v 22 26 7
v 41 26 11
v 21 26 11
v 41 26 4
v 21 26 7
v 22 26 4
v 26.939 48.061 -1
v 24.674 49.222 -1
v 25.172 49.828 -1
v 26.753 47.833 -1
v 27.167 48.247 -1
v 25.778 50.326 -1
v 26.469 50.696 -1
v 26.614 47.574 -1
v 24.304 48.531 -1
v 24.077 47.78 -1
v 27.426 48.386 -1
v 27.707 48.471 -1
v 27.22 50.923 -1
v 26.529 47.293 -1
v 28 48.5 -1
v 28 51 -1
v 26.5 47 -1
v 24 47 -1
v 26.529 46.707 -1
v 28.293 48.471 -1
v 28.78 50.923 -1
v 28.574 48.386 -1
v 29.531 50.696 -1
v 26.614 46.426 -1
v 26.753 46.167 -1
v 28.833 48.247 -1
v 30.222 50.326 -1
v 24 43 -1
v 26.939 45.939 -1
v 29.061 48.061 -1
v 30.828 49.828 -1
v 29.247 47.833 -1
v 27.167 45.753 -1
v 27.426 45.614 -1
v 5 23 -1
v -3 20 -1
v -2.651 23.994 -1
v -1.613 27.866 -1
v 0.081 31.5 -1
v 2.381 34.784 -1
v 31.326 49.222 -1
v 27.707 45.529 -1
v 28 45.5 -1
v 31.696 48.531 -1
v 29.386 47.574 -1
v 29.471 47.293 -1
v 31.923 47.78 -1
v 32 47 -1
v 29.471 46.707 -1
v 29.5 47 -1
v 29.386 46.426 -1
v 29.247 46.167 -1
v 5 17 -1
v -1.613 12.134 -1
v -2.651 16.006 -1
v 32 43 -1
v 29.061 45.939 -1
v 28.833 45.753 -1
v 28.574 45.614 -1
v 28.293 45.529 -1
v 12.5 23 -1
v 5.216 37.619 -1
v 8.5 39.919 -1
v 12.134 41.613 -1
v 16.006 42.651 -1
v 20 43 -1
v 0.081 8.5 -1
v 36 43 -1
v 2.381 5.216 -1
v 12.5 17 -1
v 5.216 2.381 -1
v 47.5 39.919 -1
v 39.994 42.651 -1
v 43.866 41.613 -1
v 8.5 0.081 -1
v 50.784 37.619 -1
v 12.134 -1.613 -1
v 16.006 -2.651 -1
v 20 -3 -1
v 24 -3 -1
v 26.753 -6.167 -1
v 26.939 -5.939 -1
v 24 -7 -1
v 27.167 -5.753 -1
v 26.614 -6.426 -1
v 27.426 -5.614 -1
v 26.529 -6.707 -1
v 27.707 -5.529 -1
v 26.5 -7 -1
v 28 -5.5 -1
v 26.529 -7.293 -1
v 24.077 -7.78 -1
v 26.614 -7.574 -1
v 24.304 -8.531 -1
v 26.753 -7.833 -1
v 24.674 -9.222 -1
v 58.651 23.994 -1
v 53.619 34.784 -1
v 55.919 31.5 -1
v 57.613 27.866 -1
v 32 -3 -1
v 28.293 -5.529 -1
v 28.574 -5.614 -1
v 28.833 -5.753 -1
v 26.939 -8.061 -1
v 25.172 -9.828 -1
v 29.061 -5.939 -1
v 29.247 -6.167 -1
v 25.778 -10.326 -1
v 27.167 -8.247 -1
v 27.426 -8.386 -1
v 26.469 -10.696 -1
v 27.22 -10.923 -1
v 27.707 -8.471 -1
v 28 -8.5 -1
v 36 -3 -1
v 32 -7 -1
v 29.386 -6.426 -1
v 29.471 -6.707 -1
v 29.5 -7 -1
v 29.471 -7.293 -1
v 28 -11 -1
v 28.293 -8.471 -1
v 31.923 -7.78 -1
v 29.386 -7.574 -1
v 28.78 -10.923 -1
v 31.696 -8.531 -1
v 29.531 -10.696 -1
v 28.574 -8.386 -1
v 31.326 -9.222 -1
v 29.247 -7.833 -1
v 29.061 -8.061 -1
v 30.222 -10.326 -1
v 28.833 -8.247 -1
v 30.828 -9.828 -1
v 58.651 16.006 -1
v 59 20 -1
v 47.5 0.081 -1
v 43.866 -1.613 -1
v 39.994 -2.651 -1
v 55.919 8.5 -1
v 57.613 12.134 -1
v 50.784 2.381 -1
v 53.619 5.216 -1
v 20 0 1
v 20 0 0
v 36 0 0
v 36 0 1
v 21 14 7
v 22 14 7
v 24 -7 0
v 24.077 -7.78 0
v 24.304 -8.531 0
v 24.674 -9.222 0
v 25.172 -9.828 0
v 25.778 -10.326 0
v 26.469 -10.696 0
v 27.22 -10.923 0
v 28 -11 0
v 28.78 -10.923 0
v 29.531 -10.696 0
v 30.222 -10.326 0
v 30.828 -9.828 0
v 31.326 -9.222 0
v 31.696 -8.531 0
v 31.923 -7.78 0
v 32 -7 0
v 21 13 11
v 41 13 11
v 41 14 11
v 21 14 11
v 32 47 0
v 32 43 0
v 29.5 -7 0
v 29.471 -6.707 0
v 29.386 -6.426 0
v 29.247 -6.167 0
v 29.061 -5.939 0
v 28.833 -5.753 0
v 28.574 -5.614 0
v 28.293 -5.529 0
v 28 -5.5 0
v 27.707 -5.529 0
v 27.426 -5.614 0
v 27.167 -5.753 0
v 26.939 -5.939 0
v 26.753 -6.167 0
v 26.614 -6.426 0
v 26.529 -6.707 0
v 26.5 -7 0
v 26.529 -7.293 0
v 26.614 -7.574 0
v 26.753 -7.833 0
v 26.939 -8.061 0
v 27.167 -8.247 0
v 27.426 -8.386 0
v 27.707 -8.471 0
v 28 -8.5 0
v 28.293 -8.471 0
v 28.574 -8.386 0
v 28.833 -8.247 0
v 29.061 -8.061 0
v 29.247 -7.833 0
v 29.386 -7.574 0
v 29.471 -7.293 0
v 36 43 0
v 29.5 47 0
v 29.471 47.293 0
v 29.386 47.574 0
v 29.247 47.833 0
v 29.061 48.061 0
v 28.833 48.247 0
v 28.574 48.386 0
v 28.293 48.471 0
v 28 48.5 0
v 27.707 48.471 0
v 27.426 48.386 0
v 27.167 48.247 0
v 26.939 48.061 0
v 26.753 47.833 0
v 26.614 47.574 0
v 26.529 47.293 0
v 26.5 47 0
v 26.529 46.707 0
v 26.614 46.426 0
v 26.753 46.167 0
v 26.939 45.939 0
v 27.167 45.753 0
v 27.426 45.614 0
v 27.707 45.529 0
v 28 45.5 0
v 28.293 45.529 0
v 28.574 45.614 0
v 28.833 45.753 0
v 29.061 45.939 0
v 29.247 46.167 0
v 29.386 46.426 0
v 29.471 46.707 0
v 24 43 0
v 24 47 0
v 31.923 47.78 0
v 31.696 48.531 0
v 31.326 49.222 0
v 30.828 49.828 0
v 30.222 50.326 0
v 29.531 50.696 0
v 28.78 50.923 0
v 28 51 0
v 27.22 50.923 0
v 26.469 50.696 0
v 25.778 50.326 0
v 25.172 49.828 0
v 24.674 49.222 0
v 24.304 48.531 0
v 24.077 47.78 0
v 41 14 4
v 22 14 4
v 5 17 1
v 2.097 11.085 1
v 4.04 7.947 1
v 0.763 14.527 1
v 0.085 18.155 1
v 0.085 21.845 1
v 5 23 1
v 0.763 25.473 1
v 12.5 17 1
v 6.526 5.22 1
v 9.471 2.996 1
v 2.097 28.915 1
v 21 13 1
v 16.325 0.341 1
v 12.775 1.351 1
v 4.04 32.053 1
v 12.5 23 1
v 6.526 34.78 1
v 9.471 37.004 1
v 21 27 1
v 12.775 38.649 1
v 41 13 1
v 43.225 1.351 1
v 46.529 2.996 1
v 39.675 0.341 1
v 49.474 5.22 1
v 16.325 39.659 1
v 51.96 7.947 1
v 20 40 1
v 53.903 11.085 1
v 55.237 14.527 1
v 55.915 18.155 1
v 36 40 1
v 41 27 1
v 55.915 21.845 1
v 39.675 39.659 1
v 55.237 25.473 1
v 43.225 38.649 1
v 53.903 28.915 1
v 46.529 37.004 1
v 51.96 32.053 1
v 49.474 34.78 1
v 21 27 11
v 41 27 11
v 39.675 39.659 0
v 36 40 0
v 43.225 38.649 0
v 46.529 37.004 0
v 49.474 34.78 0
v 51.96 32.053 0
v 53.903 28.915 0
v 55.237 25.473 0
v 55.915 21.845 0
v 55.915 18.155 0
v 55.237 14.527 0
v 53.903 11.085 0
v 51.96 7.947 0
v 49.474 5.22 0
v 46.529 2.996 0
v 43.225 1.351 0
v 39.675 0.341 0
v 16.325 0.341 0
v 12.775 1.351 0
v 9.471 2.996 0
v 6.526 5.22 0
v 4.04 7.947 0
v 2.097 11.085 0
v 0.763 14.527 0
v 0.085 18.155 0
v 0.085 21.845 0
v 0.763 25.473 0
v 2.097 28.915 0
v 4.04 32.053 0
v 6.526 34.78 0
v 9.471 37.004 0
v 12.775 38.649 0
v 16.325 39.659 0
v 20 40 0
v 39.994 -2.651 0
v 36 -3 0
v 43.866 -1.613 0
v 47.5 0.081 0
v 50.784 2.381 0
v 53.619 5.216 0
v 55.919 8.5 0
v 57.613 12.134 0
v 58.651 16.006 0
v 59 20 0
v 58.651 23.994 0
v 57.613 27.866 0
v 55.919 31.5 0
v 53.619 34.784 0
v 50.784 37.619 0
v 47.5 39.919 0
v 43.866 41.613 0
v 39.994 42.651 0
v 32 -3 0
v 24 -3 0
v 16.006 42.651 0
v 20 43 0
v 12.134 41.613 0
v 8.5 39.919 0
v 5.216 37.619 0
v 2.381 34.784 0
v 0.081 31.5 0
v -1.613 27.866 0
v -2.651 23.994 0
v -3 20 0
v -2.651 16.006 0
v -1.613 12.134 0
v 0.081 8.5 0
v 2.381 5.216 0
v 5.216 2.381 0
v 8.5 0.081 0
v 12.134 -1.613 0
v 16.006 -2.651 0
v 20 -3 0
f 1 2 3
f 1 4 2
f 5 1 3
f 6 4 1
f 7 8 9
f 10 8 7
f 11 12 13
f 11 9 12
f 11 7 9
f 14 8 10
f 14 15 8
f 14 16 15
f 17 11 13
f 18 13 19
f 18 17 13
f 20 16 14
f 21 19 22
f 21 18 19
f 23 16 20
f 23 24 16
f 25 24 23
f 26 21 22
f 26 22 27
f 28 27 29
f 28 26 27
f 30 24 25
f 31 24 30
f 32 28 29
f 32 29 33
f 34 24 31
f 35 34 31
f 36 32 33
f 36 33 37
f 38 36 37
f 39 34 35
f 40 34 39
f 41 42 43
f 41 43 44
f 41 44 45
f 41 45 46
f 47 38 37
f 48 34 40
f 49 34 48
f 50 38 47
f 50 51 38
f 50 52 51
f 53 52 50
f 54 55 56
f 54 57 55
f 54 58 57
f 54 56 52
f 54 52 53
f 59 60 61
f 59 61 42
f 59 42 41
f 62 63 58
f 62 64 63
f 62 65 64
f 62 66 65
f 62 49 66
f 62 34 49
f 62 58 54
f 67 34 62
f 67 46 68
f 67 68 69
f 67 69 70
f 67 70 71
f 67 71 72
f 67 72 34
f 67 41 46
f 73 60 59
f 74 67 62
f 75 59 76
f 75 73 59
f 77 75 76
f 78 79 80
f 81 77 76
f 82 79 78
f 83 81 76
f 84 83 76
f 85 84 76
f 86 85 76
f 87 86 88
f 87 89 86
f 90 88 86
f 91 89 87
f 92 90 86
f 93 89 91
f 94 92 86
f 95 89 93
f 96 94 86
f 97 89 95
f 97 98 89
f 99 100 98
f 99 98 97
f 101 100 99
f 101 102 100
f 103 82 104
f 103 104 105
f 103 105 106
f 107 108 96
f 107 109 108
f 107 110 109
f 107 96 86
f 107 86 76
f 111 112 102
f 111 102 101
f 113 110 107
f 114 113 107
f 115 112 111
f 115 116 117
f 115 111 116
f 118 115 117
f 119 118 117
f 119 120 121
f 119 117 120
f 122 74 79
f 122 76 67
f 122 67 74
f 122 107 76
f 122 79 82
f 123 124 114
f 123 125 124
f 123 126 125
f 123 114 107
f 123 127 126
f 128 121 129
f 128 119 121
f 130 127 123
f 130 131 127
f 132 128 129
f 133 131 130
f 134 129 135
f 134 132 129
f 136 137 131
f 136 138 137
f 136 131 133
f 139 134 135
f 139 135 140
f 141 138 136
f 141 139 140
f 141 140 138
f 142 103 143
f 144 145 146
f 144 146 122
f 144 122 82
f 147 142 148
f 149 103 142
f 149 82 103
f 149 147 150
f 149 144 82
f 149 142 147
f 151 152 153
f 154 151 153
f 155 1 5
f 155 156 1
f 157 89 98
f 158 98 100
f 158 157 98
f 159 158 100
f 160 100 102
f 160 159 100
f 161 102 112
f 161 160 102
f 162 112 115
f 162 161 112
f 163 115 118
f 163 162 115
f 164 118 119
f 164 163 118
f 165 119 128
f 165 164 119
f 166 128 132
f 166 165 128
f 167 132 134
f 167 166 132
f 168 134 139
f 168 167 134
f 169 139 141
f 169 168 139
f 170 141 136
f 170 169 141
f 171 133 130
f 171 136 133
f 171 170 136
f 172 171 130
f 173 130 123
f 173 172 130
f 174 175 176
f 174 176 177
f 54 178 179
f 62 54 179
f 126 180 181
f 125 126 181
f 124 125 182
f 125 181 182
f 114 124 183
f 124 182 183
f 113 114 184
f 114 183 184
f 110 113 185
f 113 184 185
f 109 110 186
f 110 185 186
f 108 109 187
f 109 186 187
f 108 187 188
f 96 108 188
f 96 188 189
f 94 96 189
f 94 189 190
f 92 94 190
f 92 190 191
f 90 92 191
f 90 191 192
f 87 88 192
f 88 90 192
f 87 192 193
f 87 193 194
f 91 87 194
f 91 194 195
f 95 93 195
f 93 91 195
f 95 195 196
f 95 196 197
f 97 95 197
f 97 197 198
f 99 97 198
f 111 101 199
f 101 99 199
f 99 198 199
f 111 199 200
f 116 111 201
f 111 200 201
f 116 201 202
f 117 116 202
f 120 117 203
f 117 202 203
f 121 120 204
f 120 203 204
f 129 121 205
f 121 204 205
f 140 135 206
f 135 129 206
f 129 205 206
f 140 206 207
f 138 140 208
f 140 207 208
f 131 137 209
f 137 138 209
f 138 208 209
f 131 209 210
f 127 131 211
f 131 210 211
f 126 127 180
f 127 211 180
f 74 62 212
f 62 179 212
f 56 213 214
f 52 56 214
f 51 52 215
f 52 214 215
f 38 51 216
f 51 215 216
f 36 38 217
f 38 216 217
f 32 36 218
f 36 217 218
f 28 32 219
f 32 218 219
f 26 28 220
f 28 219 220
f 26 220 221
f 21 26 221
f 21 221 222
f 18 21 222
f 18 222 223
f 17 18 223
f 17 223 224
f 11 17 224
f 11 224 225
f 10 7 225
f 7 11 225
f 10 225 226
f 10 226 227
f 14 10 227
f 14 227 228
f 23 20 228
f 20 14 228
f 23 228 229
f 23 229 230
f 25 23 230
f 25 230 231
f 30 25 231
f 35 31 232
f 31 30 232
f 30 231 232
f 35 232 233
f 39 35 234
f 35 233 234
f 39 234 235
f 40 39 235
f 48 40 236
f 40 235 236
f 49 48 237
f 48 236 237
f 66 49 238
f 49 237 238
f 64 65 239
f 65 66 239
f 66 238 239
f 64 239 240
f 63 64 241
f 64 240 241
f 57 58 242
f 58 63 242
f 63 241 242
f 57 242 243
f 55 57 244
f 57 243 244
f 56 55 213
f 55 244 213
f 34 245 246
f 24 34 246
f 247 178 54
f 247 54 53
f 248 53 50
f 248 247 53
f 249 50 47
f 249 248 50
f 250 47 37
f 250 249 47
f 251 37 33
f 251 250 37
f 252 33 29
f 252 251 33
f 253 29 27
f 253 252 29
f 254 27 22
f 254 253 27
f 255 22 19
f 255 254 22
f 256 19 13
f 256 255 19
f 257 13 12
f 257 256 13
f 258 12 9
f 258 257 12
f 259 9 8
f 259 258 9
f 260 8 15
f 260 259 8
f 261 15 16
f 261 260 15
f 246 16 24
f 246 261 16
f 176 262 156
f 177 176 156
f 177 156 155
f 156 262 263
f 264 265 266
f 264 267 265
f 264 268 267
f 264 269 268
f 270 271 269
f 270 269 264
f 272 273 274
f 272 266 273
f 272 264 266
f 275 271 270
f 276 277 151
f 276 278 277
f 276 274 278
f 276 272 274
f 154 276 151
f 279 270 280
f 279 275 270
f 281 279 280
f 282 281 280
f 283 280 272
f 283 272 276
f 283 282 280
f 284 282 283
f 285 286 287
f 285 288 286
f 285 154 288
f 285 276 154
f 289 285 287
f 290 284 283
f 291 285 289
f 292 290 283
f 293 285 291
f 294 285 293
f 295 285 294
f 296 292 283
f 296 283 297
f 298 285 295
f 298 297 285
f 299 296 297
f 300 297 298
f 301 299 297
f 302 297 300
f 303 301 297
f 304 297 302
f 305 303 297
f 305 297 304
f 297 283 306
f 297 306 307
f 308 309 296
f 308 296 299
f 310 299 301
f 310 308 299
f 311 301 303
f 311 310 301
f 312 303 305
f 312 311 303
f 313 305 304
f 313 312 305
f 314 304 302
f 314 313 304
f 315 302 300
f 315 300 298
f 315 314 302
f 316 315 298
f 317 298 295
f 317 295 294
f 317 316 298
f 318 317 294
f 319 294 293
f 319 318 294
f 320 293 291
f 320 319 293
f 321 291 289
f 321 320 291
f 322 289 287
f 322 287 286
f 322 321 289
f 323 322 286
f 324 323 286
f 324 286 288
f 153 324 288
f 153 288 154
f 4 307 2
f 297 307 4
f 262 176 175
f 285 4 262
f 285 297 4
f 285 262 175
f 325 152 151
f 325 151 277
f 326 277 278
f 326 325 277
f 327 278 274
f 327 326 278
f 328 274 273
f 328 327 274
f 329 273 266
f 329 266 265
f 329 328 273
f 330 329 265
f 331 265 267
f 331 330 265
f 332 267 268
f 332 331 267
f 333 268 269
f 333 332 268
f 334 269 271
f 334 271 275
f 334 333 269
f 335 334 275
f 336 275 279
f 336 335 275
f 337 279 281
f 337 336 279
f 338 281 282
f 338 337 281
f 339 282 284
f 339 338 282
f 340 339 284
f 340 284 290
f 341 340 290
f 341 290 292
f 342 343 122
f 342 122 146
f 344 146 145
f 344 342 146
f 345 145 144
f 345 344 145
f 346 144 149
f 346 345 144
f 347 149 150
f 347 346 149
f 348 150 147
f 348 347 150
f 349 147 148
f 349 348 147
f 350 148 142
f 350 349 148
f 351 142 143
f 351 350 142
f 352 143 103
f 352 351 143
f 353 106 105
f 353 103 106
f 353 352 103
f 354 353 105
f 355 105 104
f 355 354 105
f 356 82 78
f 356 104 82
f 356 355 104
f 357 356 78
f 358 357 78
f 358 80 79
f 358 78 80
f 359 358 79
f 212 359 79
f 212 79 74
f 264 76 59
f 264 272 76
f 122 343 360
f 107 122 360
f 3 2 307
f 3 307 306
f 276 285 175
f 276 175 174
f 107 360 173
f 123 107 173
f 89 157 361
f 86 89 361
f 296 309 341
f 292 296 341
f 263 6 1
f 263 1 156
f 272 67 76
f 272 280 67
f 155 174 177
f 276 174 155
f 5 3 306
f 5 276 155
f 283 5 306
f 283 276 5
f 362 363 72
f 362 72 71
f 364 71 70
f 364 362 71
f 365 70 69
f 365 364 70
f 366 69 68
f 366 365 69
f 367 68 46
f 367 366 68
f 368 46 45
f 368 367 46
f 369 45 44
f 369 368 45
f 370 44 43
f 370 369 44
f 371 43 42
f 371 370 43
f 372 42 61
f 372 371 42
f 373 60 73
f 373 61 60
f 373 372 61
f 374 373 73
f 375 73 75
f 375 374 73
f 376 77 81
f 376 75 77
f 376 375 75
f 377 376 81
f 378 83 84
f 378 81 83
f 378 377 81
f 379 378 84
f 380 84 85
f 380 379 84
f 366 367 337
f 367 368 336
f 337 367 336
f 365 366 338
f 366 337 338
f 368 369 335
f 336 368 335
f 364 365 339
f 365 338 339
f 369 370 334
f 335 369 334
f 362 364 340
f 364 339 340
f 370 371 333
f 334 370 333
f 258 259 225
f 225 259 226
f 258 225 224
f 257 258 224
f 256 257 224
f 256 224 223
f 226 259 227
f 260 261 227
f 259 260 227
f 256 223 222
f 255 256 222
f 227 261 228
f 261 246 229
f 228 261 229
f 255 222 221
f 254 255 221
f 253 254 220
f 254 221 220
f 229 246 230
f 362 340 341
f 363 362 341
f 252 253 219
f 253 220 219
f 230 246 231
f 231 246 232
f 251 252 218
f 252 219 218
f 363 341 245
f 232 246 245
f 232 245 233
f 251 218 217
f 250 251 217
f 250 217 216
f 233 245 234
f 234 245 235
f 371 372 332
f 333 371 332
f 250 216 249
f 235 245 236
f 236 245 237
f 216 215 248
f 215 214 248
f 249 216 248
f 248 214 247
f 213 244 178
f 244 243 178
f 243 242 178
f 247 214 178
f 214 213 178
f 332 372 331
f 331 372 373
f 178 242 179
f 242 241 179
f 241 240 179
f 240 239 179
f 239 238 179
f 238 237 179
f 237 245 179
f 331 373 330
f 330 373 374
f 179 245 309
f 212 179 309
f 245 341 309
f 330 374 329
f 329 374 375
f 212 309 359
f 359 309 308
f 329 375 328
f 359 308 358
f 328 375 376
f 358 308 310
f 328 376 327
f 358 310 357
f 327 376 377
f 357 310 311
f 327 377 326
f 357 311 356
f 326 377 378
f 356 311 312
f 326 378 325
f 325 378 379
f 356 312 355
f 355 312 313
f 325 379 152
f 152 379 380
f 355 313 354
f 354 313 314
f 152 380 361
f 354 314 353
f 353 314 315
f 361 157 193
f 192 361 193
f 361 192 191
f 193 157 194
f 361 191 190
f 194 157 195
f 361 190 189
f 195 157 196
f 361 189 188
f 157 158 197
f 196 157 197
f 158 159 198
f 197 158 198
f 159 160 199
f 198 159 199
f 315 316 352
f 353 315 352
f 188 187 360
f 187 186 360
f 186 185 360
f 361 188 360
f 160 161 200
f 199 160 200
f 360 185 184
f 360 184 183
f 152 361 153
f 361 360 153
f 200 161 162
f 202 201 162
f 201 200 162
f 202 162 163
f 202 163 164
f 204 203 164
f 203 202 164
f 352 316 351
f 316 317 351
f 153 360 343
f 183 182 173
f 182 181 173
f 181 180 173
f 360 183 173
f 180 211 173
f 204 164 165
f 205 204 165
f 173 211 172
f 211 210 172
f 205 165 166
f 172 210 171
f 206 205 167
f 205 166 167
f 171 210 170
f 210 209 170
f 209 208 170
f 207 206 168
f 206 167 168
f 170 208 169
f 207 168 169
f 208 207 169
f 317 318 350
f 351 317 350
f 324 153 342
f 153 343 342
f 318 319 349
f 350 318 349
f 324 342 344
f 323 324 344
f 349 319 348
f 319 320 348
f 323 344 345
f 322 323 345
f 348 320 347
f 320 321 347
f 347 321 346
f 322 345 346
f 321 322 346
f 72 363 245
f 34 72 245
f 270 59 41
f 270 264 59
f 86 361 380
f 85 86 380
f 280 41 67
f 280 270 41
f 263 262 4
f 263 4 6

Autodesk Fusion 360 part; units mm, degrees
sketch "Sketch1" plane through (0, 0, 0) normal (0, 0, 1) x (1, 0, 0)
  line L0 (20, 0) -> (36, 0)
  line L1 (56, 20) -> (56, 20)
  line L2 (36, 40) -> (20, 40)
  line L3 (0, 20) -> (0, 20)
  arc A0 (20, 40) -> (0, 20) centre (20, 20) ccw
  arc A1 (56, 20) -> (36, 40) centre (36, 20) ccw
  arc A2 (0, 20) -> (20, 0) centre (20, 20) ccw
  arc A3 (36, 0) -> (56, 20) centre (36, 20) ccw
  point P0 (55, 0)
  point P1 (0, 40)
  dimension "d1" = 55
  dimension "d2" = 40
  dimension "d3" = 20
  dimension "d4" = 20
  dimension "d5" = 20
  dimension "d6" = 20
extrude "Extrude1" add sketch "Sketch1" along normal blind 1
sketch "Sketch2" plane through (0, 0, 0) normal (0, 0, -1) x (1, 0, 0)
  arc A0 (36, -40) -> (36, 0) centre (36, -20) ccw
  line L0 (36, 0) -> (20, 0)
  arc A1 (20, 0) -> (20, -40) centre (20, -20) ccw
  line L1 (20, -40) -> (36, -40)
  arc A2 (36, -43) -> (36, 3) centre (36, -20) ccw
  line L2 (36, 3) -> (20, 3)
  arc A3 (20, 3) -> (20, -43) centre (20, -20) ccw
  line L3 (20, -43) -> (36, -43)
  line L4 (28, 0) -> (28, 8) construction
  line L5 (28, 0) -> (24, 0) construction
  line L6 (24, 0) -> (32, 0)
  line L7 (32, 0) -> (32, 7)
  line L8 (28, 11) -> (28, 11)
  line L9 (24, 7) -> (24, 0)
  arc A4 (28, 11) -> (24, 7) centre (28, 7) ccw
  arc A5 (32, 7) -> (28, 11) centre (28, 7) ccw
  line L10 (0, -20) -> (56, -20)
  line L11 (28, -40) -> (28, -48) construction
  line L12 (28, -40) -> (32, -40)
  line L13 (32, -40) -> (24, -40)
  line L14 (24, -40) -> (24, -47)
  line L15 (28, -51) -> (28, -51)
  line L16 (32, -47) -> (32, -40)
  arc A6 (24, -47) -> (28, -51) centre (28, -47) ccw
  arc A7 (28, -51) -> (32, -47) centre (28, -47) ccw
  circle A8 centre (28, 7) radius 1.5
  circle A9 centre (28, -47) radius 1.5
  point P0 (24, 11)
  point P1 (32, -51)
  dimension "d9" = 3
  dimension "d12" = 8
  dimension "d13" = 4
  dimension "d14" = 8
  dimension "d15" = 11
  dimension "d16" = 4
  dimension "d17" = 4
  dimension "d18" = 8
  dimension "d19" = 4
  dimension "d20" = 8
  dimension "d21" = 11
  dimension "d22" = 4
  dimension "d23" = 4
  dimension "d26" = 3
  dimension "d27" = 3
extrude "Extrude2" add sketch "Sketch2" along normal blind 1 contours A0 A1 L1 L10 L12 L13 | A0 L0 L1 A2 L2 L3 L7 L16 | A0 L0 A1 L6 L10 | L1 L3 L12 L13 L14 L16 | L0 A1 L1 L2 A3 L3 L9 L14 | L0 L2 L6 L7 L9
extrude "Extrude3" add sketch "Sketch2" along normal up to surface (1 mm away) contours L3 L14 L16 A6 A7 | L2 L7 L9 A4 A5 | A8 | A9
extrude "Extrude4" cut sketch "Sketch2" along normal up to surface (1 mm away) contours A8 | A9
sketch "Sketch3" plane through (0, 0, 1) normal (0, 0, 1) x (-1, 0, 0)
  arc A0 (-36, 0) -> (-36, -40) centre (-36, -20) ccw
  line L0 (-36, -40) -> (-20, -40)
  arc A1 (-20, -40) -> (-20, 0) centre (-20, -20) ccw
  line L1 (-20, 0) -> (-36, 0)
  line L2 (0, -20) -> (-56, -20)
  line L3 (-21, -20) -> (-21, -26) construction
  line L4 (-21, -26) -> (-22, -26)
  line L5 (-22, -26) -> (-22, -14)
  line L6 (-22, -14) -> (-21, -14)
  line L7 (-21, -14) -> (-21, -26)
  line L8 (-21, -27) -> (-41, -27)
  line L9 (-41, -27) -> (-41, -26)
  line L10 (-41, -26) -> (-21, -26)
  line L11 (-21, -26) -> (-21, -27)
  line L12 (-21, -14) -> (-41, -14)
  line L13 (-41, -14) -> (-41, -13)
  line L14 (-41, -13) -> (-21, -13)
  line L15 (-21, -13) -> (-21, -14)
  line L16 (-5, -23) -> (-12.5, -23)
  line L17 (-12.5, -23) -> (-12.5, -17)
  line L18 (-12.5, -17) -> (-5, -17)
  line L19 (-5, -17) -> (-5, -23)
  line L20 (-22, -26) -> (-41, -26)
  line L21 (-41, -26) -> (-41, -14)
  line L22 (-41, -14) -> (-22, -14)
  line L23 (-22, -14) -> (-22, -26)
  dimension "d34" = 6
  dimension "d35" = 1
  dimension "d36" = 12
  dimension "d37" = 20
  dimension "d38" = 20
  dimension "d44" = 7.5
  dimension "d45" = 6
extrude "Extrude5" add sketch "Sketch3" along normal blind 6 contours L2 L5 L6 L7 L12 L23 | L2 L4 L5 L7 L10 L23
extrude "Extrude6" add sketch "Sketch3" along normal blind 10 contours L4 L8 L9 L10 L11 L20 | L6 L12 L13 L14 L15 L22
extrude "Extrude7" cut sketch "Sketch3" against normal up to surface (2 mm away) contours L2 L16 L17 L19 | L2 L17 L18 L19
extrude "Extrude8" add sketch "Sketch3" along normal blind 3 contours L2 L5 L12 L21 L22 L23 | L2 L5 L10 L20 L21 L23
